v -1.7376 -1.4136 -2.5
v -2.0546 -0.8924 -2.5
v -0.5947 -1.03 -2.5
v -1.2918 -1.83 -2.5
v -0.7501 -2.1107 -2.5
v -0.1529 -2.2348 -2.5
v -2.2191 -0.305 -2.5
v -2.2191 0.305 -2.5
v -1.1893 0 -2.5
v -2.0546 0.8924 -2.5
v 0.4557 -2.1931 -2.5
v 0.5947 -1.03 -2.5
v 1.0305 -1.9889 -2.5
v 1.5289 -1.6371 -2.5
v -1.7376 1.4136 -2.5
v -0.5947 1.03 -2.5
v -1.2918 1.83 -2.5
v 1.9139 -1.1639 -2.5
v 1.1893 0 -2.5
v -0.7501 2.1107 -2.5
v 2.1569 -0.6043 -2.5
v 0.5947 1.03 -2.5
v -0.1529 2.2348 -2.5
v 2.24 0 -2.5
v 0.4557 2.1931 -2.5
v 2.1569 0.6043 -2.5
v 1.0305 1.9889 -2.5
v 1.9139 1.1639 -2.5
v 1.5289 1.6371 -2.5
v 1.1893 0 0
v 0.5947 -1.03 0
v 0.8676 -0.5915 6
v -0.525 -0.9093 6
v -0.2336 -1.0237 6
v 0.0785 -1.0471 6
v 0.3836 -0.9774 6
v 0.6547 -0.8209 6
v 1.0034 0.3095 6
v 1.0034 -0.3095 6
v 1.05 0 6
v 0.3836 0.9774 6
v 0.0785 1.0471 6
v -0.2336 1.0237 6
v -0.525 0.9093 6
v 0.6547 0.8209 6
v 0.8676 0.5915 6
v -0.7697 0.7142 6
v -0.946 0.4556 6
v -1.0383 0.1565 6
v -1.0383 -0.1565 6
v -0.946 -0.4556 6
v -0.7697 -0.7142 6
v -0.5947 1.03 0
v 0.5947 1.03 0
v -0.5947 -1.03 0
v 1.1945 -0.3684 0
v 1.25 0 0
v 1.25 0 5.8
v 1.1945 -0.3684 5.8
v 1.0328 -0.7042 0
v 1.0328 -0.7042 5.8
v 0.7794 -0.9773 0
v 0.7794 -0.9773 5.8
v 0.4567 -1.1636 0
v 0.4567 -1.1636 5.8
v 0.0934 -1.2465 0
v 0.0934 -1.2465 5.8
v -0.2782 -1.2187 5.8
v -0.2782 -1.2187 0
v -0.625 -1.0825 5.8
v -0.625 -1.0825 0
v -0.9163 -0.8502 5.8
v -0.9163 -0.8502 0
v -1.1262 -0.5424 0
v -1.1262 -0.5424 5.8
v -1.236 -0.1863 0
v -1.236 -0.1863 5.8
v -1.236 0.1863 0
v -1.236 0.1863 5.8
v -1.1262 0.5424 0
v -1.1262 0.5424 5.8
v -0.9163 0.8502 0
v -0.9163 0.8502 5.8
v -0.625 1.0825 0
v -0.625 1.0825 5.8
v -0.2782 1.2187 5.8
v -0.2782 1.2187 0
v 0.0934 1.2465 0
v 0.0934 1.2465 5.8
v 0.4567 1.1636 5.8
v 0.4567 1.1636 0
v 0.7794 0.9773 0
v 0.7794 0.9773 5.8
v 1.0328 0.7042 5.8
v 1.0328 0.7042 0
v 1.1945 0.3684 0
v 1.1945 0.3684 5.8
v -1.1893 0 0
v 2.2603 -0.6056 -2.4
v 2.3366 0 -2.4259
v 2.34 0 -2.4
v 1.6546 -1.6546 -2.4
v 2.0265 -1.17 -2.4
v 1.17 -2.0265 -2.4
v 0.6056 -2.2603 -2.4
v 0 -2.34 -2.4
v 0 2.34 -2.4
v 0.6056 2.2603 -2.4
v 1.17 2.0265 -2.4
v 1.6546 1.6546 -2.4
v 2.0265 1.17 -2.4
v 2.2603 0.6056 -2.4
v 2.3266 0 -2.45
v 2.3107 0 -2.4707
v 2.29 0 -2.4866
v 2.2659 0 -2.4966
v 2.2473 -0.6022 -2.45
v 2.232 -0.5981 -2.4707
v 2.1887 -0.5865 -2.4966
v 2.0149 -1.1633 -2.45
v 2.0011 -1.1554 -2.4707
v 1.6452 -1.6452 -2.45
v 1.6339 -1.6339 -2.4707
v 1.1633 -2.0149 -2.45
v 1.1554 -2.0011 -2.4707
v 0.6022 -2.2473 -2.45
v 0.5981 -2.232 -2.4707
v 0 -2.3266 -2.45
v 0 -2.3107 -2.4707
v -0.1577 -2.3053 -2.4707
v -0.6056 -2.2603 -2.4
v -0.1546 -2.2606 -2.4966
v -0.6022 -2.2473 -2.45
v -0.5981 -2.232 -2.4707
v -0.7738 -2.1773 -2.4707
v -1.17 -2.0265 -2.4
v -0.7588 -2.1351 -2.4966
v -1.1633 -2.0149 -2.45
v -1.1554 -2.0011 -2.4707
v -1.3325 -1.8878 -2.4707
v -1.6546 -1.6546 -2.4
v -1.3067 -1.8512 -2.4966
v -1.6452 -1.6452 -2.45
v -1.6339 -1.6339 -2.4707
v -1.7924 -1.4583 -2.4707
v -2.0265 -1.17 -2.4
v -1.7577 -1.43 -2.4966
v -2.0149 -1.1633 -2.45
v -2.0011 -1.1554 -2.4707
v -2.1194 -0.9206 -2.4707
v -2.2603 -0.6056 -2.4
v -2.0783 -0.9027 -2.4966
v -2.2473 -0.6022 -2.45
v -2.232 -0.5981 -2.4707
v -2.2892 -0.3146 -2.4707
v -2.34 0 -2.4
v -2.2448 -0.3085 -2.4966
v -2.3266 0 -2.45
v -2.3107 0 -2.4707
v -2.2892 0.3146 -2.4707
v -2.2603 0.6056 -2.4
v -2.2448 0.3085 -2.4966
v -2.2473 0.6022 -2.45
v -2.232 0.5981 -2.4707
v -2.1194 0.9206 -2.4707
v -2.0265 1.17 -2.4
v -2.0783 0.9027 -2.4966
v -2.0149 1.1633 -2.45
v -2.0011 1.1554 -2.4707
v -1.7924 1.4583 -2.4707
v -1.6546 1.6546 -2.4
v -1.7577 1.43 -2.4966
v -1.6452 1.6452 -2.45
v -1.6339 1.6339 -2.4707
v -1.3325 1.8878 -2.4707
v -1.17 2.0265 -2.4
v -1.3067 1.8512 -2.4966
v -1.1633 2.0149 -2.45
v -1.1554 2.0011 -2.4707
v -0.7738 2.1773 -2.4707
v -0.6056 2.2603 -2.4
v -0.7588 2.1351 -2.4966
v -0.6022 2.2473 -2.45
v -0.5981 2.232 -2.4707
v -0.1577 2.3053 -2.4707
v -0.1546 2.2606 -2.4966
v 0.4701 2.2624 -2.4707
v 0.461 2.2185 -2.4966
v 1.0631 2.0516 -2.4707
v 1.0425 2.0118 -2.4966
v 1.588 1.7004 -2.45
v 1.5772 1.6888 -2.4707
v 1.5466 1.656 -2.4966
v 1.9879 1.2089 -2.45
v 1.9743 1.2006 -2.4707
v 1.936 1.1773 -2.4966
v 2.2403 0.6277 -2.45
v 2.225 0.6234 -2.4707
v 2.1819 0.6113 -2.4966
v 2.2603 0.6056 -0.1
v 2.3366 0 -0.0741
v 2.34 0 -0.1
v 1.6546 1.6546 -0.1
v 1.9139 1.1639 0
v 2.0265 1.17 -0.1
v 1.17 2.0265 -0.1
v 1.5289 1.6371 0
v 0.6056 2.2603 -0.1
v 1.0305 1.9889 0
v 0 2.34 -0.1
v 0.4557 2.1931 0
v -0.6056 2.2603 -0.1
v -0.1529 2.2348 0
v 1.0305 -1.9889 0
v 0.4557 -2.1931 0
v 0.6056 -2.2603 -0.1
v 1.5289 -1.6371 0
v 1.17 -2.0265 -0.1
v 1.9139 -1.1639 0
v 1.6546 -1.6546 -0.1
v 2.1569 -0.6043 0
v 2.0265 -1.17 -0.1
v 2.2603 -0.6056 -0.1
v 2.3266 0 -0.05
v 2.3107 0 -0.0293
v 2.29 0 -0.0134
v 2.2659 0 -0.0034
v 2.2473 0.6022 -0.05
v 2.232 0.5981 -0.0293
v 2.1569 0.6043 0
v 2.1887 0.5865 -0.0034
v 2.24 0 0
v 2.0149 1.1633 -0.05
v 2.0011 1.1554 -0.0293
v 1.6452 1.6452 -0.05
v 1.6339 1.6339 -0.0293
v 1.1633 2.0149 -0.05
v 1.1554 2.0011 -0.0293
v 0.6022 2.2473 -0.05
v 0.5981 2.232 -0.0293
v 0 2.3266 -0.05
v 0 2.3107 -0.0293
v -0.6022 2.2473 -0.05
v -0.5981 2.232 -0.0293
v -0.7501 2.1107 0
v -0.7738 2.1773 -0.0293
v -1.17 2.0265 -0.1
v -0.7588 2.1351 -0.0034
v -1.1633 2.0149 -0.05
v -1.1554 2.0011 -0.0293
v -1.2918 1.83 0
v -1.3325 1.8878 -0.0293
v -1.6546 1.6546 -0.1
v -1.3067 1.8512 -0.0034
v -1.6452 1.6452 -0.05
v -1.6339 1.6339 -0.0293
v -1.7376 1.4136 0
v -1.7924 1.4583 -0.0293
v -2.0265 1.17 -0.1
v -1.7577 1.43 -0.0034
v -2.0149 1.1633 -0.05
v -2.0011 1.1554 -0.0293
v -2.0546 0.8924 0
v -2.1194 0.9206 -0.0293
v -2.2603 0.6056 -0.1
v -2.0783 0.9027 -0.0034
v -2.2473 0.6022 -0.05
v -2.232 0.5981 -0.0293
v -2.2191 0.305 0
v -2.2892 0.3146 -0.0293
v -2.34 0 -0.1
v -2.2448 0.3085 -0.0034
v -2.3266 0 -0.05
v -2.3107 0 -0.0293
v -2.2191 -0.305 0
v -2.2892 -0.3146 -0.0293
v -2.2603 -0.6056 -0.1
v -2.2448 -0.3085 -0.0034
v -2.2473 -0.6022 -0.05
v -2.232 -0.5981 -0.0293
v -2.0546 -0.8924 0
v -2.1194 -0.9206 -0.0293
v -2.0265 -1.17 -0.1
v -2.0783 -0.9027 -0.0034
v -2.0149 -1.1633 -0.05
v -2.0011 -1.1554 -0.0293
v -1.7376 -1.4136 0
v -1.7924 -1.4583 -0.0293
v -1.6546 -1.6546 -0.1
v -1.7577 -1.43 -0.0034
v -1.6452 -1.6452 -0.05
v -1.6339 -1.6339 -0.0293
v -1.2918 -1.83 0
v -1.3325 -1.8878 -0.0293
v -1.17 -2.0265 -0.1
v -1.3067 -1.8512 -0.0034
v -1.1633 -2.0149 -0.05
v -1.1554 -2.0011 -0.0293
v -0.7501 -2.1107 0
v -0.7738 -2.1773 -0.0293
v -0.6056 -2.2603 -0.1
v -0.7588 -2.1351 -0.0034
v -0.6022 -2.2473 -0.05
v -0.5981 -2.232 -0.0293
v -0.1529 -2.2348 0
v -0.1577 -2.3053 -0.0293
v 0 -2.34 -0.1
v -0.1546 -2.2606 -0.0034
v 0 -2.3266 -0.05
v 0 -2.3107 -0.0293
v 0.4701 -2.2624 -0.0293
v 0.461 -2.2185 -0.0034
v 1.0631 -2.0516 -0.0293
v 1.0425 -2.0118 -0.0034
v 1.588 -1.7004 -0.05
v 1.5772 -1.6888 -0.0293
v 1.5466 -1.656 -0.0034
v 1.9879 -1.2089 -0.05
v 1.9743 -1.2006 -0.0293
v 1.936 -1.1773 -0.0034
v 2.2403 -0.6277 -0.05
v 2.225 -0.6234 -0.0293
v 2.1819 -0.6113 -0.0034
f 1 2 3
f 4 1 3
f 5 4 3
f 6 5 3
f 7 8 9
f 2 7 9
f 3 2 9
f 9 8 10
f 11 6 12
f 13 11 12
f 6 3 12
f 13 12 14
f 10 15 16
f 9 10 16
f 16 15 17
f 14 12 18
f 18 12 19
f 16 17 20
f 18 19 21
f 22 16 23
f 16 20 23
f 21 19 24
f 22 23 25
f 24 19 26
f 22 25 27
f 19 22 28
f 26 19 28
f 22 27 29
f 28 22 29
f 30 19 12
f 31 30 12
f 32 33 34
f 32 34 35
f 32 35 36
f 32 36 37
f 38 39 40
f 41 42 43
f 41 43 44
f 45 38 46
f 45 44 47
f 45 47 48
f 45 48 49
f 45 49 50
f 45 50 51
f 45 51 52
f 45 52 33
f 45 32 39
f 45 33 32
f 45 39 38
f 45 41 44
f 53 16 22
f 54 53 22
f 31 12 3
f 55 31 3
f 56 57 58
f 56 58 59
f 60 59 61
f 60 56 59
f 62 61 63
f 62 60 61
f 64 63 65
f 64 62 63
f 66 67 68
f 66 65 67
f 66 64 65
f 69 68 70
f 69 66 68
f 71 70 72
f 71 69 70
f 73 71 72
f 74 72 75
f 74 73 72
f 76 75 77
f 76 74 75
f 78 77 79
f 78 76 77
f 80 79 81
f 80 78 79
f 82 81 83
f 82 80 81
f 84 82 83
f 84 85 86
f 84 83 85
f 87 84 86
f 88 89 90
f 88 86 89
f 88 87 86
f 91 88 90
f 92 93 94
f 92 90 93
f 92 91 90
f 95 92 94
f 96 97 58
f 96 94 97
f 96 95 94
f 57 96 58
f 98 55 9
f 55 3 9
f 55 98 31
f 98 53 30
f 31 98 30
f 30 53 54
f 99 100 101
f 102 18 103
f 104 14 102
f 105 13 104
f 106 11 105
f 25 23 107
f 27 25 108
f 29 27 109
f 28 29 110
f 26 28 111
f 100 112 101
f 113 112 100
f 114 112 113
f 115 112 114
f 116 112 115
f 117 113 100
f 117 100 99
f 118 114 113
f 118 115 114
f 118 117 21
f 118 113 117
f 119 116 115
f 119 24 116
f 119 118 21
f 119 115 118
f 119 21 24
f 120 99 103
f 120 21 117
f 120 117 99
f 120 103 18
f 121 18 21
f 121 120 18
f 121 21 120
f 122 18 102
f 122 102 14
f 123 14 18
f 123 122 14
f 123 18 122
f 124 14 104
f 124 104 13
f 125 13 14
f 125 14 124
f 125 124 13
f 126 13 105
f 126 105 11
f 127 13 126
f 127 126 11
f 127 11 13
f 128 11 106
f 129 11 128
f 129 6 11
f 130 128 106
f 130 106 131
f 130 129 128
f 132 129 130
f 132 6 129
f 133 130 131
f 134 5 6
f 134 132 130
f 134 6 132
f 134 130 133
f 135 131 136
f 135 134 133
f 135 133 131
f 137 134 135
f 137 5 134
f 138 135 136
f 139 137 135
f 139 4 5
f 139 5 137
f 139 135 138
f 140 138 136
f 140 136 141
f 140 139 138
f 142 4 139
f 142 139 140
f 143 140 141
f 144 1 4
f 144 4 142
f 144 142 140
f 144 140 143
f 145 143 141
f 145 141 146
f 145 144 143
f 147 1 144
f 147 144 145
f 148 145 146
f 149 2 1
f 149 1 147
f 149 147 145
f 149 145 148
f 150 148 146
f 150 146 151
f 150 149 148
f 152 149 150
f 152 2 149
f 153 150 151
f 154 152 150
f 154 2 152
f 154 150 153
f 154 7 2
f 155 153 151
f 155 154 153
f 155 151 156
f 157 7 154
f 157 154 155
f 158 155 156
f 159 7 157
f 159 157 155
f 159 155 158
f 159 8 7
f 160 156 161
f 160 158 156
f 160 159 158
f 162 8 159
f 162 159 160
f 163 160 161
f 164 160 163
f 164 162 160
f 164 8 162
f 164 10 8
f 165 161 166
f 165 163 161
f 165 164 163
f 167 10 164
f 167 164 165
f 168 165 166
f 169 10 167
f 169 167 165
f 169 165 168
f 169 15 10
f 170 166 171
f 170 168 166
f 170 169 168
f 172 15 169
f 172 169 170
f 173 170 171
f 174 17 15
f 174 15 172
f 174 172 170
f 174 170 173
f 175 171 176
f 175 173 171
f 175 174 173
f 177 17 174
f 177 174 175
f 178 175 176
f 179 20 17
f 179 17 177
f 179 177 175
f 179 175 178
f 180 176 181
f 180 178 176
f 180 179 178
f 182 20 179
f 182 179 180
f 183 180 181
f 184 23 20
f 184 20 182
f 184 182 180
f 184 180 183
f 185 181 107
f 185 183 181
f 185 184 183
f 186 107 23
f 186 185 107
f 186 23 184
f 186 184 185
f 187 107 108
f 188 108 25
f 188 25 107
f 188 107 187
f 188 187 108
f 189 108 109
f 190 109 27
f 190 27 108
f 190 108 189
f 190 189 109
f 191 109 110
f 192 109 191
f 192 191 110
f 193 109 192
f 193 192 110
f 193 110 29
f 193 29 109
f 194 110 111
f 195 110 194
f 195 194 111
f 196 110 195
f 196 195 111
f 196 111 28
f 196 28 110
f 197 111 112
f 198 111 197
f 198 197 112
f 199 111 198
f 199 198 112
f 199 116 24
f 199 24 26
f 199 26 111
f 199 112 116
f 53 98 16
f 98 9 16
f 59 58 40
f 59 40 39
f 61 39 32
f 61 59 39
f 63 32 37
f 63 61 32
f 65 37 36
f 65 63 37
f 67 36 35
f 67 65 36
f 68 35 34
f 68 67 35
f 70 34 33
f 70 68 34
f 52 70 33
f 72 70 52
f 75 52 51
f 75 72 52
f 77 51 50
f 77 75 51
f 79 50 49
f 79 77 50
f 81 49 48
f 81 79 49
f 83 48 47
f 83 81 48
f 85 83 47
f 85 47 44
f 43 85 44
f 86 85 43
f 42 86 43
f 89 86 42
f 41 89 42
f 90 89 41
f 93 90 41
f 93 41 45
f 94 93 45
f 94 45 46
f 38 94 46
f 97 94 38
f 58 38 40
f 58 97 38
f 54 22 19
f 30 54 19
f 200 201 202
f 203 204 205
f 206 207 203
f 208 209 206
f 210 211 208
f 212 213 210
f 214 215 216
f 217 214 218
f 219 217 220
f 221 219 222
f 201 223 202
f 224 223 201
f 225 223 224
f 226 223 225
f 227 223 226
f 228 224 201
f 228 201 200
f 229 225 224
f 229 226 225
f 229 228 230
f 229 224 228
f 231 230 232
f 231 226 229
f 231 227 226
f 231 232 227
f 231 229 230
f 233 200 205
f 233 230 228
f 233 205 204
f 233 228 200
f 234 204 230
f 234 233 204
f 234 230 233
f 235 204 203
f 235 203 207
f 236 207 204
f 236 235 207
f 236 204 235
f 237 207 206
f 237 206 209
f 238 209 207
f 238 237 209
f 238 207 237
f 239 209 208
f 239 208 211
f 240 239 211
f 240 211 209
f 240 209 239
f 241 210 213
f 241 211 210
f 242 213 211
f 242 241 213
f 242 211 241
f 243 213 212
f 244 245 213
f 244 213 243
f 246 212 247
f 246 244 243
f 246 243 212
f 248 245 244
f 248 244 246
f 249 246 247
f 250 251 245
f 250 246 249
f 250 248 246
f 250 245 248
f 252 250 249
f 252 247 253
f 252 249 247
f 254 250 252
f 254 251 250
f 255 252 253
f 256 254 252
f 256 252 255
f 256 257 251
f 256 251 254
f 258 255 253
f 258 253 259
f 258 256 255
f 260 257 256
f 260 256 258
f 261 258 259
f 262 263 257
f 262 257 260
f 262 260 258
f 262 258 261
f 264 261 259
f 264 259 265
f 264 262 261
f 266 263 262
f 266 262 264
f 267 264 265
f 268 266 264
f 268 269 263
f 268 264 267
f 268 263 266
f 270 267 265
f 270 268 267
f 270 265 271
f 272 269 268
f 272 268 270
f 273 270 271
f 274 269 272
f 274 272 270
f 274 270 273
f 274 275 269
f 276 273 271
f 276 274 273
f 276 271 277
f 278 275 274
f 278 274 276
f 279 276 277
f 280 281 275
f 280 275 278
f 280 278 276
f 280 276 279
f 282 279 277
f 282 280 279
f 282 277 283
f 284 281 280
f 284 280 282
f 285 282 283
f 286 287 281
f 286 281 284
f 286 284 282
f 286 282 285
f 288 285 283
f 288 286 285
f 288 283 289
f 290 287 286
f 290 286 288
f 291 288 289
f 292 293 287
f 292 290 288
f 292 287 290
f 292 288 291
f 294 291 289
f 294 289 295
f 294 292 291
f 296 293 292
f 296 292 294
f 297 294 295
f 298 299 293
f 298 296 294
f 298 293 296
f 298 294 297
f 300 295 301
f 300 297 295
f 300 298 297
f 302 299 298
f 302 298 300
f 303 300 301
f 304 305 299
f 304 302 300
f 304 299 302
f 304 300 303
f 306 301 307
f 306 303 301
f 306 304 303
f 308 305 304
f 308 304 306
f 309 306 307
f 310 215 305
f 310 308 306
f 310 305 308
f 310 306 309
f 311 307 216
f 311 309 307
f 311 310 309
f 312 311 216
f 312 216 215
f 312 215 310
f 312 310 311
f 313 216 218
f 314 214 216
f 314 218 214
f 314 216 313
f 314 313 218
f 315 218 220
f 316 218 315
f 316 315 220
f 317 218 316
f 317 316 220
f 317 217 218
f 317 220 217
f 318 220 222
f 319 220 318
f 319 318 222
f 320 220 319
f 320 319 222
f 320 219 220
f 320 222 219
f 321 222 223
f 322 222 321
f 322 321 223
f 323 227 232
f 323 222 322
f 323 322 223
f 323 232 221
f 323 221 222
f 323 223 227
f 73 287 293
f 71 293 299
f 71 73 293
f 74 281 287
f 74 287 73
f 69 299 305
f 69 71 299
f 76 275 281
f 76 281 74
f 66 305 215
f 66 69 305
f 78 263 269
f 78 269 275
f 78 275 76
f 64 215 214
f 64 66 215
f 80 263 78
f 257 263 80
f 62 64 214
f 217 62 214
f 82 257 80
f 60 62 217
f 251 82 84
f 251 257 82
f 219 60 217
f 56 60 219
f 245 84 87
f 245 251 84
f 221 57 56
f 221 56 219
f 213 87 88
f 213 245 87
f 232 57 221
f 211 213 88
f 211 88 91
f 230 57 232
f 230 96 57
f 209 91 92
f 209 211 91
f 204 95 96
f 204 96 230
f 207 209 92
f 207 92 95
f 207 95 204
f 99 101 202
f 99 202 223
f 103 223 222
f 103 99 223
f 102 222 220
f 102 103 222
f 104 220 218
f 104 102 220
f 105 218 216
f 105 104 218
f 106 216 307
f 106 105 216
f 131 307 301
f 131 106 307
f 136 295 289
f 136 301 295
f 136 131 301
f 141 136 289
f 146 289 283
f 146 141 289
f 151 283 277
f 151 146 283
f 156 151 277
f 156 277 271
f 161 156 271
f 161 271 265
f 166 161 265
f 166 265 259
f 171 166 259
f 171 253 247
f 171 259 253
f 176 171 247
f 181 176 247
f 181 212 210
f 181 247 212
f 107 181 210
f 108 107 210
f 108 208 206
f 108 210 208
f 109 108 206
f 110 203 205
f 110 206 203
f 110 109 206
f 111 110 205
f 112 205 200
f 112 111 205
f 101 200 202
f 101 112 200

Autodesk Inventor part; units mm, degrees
ref_plane "YZ Plane" through (0, 0, 0) normal (1, 0, 0) x (0, 1, 0)
ref_plane "XZ Plane" through (0, 0, 0) normal (0, 1, 0) x (-1, 0, 0)
ref_plane "Work Plane1" through (0, 0, -2.5) normal (0, 0, 1) x (1, 0, 0)
sketch "Sketch1" plane through (0, 0, -2.5) normal (0, 0, 1) x (1, 0, 0)
  circle A0 centre (0, 0) radius 2.34
extrude "Extrusion3" add sketch "Sketch1" along normal blind 2.5
sketch "Sketch2" plane through (0, 0, 0) normal (0, 0, 1) x (1, 0, 0)
  circle A0 centre (0, 0) radius 1.25
extrude "Extrusion2" add sketch "Sketch2" along normal blind 6
sketch "Sketch3" plane through (0, 0, -2.5) normal (0, 0, 1) x (1, 0, 0)
  line L0 (0.5947, -1.03) -> (-0.5947, -1.03)
  line L1 (0.5947, 1.03) -> (1.1893, 0)
  line L2 (-0.5947, -1.03) -> (-1.1893, 0)
  line L3 (-1.1893, 0) -> (-0.5947, 1.03)
  line L4 (1.1893, 0) -> (0.5947, -1.03)
  line L5 (-0.5947, 1.03) -> (0.5947, 1.03)
extrude "Extrusion1" cut sketch "Sketch3" along normal blind 2.5
fillet "Fillet1" radius 0.1 2 edges at (-2.34, 0, 0) (-2.34, 0, -2.5)
chamfer "Chamfer1" distance 0.2 angle 45 1 edges at (-1.25, 0, 6)
properties part number "M2.5 x 6mm SHCS"
